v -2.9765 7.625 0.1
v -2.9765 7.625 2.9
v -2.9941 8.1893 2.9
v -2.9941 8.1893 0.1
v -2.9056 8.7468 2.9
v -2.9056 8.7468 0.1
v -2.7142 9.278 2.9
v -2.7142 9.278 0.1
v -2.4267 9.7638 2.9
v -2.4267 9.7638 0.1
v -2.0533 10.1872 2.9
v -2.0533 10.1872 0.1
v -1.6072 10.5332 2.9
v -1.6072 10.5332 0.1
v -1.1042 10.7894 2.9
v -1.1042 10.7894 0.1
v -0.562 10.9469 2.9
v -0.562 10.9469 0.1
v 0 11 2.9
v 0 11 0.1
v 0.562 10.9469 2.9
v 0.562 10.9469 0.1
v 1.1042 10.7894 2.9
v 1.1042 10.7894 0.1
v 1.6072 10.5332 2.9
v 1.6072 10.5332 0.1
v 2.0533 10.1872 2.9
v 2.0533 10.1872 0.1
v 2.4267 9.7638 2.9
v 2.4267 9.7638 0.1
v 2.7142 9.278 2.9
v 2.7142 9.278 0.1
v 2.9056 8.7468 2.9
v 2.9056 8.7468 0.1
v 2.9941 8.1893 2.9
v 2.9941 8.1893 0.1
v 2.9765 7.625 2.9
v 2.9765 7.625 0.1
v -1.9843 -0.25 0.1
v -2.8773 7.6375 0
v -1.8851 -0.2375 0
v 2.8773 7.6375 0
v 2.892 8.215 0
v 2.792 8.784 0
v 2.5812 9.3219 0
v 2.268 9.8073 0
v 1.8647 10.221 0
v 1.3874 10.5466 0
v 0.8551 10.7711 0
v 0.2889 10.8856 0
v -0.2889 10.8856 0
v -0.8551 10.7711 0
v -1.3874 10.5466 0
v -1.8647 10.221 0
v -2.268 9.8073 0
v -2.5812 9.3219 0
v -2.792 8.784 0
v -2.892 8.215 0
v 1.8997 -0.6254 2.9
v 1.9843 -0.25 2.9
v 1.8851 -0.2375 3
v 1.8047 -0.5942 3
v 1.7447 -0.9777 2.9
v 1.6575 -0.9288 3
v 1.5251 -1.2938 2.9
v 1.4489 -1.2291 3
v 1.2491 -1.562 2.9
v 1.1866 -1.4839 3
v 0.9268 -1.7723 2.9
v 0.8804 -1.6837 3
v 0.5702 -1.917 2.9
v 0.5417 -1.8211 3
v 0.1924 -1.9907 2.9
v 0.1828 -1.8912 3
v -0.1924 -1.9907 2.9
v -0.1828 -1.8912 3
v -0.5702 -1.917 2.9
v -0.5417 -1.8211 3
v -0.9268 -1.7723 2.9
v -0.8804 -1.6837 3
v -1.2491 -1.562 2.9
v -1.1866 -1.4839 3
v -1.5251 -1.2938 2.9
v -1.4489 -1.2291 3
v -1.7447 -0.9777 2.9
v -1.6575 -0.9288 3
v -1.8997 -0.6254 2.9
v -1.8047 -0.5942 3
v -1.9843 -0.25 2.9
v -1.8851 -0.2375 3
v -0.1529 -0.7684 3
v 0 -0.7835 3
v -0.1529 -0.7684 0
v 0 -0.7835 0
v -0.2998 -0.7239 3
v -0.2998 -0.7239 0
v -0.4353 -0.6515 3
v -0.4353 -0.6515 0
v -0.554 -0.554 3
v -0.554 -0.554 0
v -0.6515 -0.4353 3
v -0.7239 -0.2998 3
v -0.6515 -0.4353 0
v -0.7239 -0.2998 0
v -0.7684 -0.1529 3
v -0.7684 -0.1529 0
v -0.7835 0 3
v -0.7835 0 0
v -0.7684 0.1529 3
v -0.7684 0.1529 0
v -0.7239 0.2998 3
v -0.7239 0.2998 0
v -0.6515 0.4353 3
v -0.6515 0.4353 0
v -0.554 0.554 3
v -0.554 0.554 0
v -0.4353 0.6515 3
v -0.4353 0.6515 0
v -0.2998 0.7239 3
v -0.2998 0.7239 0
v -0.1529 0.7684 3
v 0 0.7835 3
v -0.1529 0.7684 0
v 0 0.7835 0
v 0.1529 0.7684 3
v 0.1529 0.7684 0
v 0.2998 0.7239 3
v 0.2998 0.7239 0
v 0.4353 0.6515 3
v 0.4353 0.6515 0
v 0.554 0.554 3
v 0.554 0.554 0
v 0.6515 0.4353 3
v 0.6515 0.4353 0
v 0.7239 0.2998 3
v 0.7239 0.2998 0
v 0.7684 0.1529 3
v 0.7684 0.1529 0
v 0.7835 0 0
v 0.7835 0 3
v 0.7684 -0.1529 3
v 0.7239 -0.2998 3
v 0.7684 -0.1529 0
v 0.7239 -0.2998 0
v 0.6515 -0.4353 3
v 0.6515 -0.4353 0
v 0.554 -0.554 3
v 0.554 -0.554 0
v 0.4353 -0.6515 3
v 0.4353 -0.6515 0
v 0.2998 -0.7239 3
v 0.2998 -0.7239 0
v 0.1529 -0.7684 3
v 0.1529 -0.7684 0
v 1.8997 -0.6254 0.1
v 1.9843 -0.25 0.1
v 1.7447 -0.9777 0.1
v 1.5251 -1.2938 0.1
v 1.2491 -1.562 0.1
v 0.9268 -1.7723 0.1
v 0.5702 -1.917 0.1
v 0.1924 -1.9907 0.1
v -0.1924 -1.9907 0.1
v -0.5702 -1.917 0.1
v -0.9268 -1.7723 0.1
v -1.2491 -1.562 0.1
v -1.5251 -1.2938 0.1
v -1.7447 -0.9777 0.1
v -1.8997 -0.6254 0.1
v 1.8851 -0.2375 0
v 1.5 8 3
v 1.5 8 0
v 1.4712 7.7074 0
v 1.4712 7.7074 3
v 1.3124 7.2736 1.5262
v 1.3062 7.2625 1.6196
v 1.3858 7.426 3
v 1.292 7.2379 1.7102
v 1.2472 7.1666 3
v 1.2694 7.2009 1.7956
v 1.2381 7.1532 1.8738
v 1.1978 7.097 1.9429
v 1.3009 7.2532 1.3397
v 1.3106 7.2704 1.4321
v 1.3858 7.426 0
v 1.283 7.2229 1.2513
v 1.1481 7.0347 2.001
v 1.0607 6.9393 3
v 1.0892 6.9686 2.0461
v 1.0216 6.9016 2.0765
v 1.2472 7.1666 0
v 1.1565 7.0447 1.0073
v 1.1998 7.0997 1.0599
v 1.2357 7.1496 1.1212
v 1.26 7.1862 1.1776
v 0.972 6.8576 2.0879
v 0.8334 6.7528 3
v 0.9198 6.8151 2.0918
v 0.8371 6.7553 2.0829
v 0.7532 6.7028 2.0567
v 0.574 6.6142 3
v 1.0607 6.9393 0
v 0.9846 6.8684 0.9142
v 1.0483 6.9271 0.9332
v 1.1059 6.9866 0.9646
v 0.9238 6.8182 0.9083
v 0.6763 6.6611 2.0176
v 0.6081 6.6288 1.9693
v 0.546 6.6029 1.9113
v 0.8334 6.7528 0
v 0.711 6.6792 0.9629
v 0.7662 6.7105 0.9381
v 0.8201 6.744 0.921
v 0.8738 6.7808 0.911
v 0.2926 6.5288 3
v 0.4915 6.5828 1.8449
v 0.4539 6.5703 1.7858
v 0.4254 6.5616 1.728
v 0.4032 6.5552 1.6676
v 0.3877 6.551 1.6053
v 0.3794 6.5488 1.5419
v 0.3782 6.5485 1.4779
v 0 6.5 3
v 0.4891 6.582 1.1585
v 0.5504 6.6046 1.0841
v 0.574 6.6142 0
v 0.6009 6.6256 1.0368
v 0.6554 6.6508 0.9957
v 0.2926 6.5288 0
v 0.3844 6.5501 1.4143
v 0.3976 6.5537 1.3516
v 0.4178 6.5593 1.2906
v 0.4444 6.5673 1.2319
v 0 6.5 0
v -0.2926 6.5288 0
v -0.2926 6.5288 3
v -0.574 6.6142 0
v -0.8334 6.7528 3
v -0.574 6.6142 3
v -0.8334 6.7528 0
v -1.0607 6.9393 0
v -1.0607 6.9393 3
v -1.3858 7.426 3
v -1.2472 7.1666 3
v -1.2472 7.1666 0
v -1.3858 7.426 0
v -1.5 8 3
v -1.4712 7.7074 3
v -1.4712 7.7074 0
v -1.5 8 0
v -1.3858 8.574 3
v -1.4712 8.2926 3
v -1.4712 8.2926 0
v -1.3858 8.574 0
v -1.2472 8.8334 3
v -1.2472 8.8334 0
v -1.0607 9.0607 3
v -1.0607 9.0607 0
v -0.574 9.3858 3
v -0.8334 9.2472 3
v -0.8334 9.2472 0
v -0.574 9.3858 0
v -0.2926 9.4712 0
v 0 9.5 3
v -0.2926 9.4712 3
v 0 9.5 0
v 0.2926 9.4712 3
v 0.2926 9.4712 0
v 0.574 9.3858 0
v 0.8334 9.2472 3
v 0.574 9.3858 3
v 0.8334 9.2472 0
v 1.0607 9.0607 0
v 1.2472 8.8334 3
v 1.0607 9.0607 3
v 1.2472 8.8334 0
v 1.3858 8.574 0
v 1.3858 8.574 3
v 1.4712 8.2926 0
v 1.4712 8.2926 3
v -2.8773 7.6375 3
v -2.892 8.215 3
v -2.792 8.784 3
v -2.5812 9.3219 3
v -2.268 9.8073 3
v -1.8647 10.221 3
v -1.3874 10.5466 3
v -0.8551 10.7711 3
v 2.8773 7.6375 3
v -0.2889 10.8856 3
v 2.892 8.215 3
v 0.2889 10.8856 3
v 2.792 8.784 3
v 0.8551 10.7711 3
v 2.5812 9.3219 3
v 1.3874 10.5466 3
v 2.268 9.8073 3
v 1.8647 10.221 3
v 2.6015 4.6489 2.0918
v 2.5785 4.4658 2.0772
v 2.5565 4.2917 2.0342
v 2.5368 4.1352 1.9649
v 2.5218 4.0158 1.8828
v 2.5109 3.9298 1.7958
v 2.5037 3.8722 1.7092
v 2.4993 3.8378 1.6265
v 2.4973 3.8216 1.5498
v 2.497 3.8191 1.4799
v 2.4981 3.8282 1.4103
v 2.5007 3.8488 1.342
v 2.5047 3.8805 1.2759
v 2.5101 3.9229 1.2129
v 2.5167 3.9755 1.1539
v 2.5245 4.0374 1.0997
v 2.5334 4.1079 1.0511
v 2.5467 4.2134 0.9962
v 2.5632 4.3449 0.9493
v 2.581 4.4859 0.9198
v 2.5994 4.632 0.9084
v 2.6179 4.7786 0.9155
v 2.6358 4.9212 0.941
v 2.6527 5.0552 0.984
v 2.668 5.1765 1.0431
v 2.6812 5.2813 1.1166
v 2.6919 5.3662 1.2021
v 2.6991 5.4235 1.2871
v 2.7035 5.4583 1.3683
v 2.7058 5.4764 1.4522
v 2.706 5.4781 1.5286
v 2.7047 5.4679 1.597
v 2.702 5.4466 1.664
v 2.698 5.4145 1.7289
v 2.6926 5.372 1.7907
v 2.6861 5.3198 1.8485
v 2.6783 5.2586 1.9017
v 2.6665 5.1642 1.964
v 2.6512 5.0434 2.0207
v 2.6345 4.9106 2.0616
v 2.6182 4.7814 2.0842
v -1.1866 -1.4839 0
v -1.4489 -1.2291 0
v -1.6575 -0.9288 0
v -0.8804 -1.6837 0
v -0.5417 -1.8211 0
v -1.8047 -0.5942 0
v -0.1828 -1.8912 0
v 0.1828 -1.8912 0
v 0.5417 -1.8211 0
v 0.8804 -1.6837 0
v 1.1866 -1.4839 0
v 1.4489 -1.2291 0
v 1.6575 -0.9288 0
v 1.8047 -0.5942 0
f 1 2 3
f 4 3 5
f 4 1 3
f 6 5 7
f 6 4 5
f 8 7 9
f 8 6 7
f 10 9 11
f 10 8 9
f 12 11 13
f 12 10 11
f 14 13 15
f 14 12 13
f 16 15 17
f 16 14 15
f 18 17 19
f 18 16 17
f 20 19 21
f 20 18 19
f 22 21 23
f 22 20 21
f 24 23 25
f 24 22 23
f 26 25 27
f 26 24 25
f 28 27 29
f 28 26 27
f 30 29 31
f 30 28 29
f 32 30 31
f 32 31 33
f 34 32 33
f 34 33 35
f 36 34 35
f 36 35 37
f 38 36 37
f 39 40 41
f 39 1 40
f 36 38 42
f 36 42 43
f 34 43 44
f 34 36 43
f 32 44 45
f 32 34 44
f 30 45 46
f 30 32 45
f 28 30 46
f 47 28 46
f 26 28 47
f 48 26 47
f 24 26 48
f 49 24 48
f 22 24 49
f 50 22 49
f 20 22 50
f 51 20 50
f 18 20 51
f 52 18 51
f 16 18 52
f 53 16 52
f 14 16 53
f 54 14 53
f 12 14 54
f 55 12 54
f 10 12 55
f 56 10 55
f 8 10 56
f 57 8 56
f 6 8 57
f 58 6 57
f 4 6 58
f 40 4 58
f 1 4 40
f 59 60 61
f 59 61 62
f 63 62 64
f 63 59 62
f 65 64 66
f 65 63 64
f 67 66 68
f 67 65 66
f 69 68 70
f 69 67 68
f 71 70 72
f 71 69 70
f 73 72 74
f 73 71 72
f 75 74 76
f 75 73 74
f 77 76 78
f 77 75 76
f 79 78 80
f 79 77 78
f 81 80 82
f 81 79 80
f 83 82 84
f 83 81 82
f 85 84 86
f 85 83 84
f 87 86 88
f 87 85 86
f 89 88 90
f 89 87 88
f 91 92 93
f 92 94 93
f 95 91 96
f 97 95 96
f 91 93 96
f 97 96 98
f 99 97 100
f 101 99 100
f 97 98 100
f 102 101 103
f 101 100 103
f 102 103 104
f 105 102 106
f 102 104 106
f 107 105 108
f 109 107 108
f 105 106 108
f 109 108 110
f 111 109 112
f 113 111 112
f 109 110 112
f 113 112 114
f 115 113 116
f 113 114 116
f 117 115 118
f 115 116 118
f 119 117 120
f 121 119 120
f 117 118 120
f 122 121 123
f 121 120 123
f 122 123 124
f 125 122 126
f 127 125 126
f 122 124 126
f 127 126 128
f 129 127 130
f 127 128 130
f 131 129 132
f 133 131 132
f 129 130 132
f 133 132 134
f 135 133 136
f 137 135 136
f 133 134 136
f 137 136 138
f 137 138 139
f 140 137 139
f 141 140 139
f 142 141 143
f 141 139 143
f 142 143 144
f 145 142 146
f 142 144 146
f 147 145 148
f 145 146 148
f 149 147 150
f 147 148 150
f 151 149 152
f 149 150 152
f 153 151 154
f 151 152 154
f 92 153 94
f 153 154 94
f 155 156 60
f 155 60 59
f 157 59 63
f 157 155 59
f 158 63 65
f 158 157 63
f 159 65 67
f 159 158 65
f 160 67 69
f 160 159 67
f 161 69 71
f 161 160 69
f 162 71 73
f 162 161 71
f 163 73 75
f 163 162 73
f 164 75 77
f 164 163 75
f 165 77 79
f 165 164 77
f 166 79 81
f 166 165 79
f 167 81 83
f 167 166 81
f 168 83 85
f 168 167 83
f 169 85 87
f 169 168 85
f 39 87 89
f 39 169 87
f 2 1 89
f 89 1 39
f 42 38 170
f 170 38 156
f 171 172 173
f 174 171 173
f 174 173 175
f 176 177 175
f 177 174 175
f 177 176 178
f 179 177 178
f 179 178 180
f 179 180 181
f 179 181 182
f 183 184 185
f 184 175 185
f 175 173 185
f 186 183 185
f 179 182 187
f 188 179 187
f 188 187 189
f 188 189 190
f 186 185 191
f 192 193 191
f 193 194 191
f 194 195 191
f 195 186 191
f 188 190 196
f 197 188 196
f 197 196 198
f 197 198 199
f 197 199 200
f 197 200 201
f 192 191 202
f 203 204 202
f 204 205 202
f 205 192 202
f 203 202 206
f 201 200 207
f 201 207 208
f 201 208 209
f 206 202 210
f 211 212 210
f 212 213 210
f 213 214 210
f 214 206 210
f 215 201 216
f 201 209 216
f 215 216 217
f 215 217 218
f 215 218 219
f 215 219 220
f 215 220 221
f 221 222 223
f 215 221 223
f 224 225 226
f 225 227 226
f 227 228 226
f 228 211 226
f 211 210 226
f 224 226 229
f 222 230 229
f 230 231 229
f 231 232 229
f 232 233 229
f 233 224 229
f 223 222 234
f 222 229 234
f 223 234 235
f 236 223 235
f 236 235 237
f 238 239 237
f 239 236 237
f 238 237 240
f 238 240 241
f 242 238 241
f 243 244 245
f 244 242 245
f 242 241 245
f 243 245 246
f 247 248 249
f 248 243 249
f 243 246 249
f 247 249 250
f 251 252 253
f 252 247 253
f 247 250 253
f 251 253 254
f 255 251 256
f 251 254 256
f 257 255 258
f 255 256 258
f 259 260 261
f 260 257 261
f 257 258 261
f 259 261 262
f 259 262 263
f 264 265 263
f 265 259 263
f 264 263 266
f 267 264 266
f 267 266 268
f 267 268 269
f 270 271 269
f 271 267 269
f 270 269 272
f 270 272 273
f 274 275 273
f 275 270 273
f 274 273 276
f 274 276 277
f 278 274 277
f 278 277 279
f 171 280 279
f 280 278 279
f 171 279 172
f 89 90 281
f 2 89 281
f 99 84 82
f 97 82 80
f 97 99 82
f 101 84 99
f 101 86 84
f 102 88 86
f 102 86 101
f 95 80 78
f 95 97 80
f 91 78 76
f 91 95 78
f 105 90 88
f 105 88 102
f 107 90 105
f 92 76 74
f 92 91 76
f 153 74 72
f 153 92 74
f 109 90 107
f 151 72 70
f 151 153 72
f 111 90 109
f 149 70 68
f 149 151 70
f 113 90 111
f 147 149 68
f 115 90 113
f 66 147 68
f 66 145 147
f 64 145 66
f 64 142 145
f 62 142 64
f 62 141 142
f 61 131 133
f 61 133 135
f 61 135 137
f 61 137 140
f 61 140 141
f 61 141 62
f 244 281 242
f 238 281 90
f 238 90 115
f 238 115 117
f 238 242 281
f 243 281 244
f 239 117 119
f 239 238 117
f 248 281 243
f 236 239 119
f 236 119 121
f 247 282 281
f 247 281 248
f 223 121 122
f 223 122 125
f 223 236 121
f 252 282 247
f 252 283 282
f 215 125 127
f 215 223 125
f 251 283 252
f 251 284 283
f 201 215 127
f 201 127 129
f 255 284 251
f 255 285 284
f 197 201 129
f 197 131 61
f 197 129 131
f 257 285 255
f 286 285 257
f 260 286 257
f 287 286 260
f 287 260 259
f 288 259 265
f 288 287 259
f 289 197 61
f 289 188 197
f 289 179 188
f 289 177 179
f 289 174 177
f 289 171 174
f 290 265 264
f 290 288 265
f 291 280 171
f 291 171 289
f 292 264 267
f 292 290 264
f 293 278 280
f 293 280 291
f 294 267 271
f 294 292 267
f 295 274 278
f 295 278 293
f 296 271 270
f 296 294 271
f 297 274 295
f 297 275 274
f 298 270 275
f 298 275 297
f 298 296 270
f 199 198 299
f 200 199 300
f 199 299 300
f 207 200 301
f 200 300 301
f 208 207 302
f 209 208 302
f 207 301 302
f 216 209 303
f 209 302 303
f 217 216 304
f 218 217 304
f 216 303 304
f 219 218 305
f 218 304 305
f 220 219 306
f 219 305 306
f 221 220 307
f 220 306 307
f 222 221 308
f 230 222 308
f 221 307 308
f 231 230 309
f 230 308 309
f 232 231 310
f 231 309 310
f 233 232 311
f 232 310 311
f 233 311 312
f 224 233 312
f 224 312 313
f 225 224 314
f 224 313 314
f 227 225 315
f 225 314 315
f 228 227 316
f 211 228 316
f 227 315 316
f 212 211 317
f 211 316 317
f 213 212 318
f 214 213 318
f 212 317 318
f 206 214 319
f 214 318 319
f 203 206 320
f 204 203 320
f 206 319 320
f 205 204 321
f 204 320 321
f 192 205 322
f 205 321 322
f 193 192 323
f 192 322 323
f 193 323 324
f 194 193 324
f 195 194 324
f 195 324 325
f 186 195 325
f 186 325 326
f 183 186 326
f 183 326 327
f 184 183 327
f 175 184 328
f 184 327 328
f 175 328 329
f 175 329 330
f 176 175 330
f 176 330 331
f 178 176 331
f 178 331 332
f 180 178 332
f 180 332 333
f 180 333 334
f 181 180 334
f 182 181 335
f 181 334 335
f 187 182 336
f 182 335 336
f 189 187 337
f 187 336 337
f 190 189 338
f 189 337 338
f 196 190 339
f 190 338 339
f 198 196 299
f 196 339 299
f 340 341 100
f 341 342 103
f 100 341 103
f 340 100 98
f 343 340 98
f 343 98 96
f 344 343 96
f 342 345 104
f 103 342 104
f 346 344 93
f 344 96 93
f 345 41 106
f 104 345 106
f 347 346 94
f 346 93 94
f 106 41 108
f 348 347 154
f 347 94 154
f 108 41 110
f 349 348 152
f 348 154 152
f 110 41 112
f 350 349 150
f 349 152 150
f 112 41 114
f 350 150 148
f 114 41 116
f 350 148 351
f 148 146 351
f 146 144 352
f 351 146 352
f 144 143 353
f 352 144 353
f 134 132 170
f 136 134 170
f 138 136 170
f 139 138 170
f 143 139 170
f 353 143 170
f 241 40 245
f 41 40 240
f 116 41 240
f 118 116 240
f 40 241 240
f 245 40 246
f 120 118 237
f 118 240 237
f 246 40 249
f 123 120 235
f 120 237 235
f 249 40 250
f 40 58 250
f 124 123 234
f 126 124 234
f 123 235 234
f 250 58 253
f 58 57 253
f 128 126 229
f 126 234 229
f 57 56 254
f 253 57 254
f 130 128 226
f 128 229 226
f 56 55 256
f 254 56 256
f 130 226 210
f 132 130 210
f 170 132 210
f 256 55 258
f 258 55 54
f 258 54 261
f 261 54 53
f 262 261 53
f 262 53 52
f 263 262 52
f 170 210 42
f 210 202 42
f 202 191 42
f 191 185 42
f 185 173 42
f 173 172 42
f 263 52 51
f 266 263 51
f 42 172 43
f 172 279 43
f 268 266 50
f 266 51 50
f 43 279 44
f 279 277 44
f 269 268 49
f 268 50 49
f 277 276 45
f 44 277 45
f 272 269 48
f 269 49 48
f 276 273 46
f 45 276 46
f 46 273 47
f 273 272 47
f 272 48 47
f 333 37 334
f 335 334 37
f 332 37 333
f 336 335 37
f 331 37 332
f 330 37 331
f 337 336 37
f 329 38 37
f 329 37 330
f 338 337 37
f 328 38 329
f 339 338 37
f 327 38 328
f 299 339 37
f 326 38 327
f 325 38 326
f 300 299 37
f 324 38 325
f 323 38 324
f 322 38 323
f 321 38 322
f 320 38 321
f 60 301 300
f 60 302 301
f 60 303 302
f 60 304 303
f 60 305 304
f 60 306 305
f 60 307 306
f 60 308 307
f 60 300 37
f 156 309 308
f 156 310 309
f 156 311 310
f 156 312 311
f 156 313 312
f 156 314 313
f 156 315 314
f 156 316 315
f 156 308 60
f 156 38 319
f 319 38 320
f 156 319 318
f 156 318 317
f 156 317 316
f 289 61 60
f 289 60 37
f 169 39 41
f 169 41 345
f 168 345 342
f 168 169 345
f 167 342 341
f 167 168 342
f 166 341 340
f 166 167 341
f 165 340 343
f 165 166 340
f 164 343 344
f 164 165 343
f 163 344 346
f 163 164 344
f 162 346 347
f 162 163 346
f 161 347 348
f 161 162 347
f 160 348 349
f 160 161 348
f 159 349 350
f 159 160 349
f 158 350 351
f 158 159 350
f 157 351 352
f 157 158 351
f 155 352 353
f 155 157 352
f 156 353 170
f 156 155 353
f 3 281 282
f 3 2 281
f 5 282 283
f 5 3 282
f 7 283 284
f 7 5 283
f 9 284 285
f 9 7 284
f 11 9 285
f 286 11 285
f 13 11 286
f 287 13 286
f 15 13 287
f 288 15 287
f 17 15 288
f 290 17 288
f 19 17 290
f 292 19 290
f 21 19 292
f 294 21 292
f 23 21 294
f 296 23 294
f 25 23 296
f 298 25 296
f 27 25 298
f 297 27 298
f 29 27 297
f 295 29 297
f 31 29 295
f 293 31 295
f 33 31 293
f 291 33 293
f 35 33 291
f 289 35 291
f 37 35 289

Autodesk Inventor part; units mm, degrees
ref_plane "YZ Plane" through (0, 0, 0) normal (1, 0, 0) x (0, 1, 0)
ref_plane "XZ Plane" through (0, 0, 0) normal (0, 1, 0) x (-1, 0, 0)
sketch "Sketch1" plane through (0, 0, 0) normal (0, 0, 1) x (1, 0, 0)
  arc A0 (-1.9843, -0.25) -> (1.9843, -0.25) centre (0, 0) ccw
  arc A1 (2.9765, 7.625) -> (-2.9765, 7.625) centre (0, 8) ccw
  line L0 (2.9765, 7.625) -> (1.9843, -0.25)
  line L1 (-2.9765, 7.625) -> (-1.9843, -0.25)
  circle A2 centre (0, 8) radius 1.5
  dimension "d0" = 3
  dimension "d1" = 2
  dimension "d2" = 8
  dimension "d3" = 3
extrude "Extrusion1" add sketch "Sketch1" along normal blind 3
sketch "Sketch2" plane through (0, 0, 3) normal (0, 0, 1) x (1, 0, 0)
  arc A0 (-1.9843, -0.25) -> (1.9843, -0.25) centre (0, 0) ccw projected
hole "Hole1" at (0, 0, 3) direction (0, 0, -1) diameter 1.567 end through all thread size "M2x0.4" class "6H" standard "ANSI Metric M Profile"
ref_plane "Work Plane2" through (1.7501, 9.2049, 0) normal (0.6132, -0.7899, 0) x (0, 0, 1)
ref_plane "Work Plane1" through (2.9765, 7.625, 0) normal (0.6132, -0.7899, 0) x (0, 0, 1)
sketch "Sketch3" plane through (1.7501, 9.2049, 0) normal (0.6132, -0.7899, 0) x (0, 0, 1)
  line L0 (0, 5.6125) -> (0, 0) projected
  line L1 (0, 0) -> (0, 4.7025) projected
  line L2 (0, 4.7025) -> (3, 4.7025) projected
  line L3 (3, 0) -> (3, 4.7025) projected
  line L4 (0, 0) -> (3, 0) projected
  line L5 (0, -0.8787) -> (3, -0.8787) projected
  point P0 (0, 7.0267)
  point P1 (1.5, 2.1213)
  point P2 (1.5, -0.8787)
  dimension "d15" = 1.5
  dimension "d16" = 3
hole "Hole2" at (0.0744, 7.9042, 1.5) direction (0.6132, -0.7899, 0) diameter 1.1835 end through all thread size "M1.4x0.3" class "6H" standard "ANSI Metric M Profile"
chamfer "Chamfer1" distance 0.1 angle 45 8 edges at (0, 11, 3) (-2.4804, 3.6875, 3) (0, -2, 3) (2.4804, 3.6875, 3) (2.4804, 3.6875, 0) (0, 11, 0) (-2.4804, 3.6875, 0) (0, -2, 0)
properties part number "27 - Valve Level" material "Steel AISI 1020 108 ANLD"
